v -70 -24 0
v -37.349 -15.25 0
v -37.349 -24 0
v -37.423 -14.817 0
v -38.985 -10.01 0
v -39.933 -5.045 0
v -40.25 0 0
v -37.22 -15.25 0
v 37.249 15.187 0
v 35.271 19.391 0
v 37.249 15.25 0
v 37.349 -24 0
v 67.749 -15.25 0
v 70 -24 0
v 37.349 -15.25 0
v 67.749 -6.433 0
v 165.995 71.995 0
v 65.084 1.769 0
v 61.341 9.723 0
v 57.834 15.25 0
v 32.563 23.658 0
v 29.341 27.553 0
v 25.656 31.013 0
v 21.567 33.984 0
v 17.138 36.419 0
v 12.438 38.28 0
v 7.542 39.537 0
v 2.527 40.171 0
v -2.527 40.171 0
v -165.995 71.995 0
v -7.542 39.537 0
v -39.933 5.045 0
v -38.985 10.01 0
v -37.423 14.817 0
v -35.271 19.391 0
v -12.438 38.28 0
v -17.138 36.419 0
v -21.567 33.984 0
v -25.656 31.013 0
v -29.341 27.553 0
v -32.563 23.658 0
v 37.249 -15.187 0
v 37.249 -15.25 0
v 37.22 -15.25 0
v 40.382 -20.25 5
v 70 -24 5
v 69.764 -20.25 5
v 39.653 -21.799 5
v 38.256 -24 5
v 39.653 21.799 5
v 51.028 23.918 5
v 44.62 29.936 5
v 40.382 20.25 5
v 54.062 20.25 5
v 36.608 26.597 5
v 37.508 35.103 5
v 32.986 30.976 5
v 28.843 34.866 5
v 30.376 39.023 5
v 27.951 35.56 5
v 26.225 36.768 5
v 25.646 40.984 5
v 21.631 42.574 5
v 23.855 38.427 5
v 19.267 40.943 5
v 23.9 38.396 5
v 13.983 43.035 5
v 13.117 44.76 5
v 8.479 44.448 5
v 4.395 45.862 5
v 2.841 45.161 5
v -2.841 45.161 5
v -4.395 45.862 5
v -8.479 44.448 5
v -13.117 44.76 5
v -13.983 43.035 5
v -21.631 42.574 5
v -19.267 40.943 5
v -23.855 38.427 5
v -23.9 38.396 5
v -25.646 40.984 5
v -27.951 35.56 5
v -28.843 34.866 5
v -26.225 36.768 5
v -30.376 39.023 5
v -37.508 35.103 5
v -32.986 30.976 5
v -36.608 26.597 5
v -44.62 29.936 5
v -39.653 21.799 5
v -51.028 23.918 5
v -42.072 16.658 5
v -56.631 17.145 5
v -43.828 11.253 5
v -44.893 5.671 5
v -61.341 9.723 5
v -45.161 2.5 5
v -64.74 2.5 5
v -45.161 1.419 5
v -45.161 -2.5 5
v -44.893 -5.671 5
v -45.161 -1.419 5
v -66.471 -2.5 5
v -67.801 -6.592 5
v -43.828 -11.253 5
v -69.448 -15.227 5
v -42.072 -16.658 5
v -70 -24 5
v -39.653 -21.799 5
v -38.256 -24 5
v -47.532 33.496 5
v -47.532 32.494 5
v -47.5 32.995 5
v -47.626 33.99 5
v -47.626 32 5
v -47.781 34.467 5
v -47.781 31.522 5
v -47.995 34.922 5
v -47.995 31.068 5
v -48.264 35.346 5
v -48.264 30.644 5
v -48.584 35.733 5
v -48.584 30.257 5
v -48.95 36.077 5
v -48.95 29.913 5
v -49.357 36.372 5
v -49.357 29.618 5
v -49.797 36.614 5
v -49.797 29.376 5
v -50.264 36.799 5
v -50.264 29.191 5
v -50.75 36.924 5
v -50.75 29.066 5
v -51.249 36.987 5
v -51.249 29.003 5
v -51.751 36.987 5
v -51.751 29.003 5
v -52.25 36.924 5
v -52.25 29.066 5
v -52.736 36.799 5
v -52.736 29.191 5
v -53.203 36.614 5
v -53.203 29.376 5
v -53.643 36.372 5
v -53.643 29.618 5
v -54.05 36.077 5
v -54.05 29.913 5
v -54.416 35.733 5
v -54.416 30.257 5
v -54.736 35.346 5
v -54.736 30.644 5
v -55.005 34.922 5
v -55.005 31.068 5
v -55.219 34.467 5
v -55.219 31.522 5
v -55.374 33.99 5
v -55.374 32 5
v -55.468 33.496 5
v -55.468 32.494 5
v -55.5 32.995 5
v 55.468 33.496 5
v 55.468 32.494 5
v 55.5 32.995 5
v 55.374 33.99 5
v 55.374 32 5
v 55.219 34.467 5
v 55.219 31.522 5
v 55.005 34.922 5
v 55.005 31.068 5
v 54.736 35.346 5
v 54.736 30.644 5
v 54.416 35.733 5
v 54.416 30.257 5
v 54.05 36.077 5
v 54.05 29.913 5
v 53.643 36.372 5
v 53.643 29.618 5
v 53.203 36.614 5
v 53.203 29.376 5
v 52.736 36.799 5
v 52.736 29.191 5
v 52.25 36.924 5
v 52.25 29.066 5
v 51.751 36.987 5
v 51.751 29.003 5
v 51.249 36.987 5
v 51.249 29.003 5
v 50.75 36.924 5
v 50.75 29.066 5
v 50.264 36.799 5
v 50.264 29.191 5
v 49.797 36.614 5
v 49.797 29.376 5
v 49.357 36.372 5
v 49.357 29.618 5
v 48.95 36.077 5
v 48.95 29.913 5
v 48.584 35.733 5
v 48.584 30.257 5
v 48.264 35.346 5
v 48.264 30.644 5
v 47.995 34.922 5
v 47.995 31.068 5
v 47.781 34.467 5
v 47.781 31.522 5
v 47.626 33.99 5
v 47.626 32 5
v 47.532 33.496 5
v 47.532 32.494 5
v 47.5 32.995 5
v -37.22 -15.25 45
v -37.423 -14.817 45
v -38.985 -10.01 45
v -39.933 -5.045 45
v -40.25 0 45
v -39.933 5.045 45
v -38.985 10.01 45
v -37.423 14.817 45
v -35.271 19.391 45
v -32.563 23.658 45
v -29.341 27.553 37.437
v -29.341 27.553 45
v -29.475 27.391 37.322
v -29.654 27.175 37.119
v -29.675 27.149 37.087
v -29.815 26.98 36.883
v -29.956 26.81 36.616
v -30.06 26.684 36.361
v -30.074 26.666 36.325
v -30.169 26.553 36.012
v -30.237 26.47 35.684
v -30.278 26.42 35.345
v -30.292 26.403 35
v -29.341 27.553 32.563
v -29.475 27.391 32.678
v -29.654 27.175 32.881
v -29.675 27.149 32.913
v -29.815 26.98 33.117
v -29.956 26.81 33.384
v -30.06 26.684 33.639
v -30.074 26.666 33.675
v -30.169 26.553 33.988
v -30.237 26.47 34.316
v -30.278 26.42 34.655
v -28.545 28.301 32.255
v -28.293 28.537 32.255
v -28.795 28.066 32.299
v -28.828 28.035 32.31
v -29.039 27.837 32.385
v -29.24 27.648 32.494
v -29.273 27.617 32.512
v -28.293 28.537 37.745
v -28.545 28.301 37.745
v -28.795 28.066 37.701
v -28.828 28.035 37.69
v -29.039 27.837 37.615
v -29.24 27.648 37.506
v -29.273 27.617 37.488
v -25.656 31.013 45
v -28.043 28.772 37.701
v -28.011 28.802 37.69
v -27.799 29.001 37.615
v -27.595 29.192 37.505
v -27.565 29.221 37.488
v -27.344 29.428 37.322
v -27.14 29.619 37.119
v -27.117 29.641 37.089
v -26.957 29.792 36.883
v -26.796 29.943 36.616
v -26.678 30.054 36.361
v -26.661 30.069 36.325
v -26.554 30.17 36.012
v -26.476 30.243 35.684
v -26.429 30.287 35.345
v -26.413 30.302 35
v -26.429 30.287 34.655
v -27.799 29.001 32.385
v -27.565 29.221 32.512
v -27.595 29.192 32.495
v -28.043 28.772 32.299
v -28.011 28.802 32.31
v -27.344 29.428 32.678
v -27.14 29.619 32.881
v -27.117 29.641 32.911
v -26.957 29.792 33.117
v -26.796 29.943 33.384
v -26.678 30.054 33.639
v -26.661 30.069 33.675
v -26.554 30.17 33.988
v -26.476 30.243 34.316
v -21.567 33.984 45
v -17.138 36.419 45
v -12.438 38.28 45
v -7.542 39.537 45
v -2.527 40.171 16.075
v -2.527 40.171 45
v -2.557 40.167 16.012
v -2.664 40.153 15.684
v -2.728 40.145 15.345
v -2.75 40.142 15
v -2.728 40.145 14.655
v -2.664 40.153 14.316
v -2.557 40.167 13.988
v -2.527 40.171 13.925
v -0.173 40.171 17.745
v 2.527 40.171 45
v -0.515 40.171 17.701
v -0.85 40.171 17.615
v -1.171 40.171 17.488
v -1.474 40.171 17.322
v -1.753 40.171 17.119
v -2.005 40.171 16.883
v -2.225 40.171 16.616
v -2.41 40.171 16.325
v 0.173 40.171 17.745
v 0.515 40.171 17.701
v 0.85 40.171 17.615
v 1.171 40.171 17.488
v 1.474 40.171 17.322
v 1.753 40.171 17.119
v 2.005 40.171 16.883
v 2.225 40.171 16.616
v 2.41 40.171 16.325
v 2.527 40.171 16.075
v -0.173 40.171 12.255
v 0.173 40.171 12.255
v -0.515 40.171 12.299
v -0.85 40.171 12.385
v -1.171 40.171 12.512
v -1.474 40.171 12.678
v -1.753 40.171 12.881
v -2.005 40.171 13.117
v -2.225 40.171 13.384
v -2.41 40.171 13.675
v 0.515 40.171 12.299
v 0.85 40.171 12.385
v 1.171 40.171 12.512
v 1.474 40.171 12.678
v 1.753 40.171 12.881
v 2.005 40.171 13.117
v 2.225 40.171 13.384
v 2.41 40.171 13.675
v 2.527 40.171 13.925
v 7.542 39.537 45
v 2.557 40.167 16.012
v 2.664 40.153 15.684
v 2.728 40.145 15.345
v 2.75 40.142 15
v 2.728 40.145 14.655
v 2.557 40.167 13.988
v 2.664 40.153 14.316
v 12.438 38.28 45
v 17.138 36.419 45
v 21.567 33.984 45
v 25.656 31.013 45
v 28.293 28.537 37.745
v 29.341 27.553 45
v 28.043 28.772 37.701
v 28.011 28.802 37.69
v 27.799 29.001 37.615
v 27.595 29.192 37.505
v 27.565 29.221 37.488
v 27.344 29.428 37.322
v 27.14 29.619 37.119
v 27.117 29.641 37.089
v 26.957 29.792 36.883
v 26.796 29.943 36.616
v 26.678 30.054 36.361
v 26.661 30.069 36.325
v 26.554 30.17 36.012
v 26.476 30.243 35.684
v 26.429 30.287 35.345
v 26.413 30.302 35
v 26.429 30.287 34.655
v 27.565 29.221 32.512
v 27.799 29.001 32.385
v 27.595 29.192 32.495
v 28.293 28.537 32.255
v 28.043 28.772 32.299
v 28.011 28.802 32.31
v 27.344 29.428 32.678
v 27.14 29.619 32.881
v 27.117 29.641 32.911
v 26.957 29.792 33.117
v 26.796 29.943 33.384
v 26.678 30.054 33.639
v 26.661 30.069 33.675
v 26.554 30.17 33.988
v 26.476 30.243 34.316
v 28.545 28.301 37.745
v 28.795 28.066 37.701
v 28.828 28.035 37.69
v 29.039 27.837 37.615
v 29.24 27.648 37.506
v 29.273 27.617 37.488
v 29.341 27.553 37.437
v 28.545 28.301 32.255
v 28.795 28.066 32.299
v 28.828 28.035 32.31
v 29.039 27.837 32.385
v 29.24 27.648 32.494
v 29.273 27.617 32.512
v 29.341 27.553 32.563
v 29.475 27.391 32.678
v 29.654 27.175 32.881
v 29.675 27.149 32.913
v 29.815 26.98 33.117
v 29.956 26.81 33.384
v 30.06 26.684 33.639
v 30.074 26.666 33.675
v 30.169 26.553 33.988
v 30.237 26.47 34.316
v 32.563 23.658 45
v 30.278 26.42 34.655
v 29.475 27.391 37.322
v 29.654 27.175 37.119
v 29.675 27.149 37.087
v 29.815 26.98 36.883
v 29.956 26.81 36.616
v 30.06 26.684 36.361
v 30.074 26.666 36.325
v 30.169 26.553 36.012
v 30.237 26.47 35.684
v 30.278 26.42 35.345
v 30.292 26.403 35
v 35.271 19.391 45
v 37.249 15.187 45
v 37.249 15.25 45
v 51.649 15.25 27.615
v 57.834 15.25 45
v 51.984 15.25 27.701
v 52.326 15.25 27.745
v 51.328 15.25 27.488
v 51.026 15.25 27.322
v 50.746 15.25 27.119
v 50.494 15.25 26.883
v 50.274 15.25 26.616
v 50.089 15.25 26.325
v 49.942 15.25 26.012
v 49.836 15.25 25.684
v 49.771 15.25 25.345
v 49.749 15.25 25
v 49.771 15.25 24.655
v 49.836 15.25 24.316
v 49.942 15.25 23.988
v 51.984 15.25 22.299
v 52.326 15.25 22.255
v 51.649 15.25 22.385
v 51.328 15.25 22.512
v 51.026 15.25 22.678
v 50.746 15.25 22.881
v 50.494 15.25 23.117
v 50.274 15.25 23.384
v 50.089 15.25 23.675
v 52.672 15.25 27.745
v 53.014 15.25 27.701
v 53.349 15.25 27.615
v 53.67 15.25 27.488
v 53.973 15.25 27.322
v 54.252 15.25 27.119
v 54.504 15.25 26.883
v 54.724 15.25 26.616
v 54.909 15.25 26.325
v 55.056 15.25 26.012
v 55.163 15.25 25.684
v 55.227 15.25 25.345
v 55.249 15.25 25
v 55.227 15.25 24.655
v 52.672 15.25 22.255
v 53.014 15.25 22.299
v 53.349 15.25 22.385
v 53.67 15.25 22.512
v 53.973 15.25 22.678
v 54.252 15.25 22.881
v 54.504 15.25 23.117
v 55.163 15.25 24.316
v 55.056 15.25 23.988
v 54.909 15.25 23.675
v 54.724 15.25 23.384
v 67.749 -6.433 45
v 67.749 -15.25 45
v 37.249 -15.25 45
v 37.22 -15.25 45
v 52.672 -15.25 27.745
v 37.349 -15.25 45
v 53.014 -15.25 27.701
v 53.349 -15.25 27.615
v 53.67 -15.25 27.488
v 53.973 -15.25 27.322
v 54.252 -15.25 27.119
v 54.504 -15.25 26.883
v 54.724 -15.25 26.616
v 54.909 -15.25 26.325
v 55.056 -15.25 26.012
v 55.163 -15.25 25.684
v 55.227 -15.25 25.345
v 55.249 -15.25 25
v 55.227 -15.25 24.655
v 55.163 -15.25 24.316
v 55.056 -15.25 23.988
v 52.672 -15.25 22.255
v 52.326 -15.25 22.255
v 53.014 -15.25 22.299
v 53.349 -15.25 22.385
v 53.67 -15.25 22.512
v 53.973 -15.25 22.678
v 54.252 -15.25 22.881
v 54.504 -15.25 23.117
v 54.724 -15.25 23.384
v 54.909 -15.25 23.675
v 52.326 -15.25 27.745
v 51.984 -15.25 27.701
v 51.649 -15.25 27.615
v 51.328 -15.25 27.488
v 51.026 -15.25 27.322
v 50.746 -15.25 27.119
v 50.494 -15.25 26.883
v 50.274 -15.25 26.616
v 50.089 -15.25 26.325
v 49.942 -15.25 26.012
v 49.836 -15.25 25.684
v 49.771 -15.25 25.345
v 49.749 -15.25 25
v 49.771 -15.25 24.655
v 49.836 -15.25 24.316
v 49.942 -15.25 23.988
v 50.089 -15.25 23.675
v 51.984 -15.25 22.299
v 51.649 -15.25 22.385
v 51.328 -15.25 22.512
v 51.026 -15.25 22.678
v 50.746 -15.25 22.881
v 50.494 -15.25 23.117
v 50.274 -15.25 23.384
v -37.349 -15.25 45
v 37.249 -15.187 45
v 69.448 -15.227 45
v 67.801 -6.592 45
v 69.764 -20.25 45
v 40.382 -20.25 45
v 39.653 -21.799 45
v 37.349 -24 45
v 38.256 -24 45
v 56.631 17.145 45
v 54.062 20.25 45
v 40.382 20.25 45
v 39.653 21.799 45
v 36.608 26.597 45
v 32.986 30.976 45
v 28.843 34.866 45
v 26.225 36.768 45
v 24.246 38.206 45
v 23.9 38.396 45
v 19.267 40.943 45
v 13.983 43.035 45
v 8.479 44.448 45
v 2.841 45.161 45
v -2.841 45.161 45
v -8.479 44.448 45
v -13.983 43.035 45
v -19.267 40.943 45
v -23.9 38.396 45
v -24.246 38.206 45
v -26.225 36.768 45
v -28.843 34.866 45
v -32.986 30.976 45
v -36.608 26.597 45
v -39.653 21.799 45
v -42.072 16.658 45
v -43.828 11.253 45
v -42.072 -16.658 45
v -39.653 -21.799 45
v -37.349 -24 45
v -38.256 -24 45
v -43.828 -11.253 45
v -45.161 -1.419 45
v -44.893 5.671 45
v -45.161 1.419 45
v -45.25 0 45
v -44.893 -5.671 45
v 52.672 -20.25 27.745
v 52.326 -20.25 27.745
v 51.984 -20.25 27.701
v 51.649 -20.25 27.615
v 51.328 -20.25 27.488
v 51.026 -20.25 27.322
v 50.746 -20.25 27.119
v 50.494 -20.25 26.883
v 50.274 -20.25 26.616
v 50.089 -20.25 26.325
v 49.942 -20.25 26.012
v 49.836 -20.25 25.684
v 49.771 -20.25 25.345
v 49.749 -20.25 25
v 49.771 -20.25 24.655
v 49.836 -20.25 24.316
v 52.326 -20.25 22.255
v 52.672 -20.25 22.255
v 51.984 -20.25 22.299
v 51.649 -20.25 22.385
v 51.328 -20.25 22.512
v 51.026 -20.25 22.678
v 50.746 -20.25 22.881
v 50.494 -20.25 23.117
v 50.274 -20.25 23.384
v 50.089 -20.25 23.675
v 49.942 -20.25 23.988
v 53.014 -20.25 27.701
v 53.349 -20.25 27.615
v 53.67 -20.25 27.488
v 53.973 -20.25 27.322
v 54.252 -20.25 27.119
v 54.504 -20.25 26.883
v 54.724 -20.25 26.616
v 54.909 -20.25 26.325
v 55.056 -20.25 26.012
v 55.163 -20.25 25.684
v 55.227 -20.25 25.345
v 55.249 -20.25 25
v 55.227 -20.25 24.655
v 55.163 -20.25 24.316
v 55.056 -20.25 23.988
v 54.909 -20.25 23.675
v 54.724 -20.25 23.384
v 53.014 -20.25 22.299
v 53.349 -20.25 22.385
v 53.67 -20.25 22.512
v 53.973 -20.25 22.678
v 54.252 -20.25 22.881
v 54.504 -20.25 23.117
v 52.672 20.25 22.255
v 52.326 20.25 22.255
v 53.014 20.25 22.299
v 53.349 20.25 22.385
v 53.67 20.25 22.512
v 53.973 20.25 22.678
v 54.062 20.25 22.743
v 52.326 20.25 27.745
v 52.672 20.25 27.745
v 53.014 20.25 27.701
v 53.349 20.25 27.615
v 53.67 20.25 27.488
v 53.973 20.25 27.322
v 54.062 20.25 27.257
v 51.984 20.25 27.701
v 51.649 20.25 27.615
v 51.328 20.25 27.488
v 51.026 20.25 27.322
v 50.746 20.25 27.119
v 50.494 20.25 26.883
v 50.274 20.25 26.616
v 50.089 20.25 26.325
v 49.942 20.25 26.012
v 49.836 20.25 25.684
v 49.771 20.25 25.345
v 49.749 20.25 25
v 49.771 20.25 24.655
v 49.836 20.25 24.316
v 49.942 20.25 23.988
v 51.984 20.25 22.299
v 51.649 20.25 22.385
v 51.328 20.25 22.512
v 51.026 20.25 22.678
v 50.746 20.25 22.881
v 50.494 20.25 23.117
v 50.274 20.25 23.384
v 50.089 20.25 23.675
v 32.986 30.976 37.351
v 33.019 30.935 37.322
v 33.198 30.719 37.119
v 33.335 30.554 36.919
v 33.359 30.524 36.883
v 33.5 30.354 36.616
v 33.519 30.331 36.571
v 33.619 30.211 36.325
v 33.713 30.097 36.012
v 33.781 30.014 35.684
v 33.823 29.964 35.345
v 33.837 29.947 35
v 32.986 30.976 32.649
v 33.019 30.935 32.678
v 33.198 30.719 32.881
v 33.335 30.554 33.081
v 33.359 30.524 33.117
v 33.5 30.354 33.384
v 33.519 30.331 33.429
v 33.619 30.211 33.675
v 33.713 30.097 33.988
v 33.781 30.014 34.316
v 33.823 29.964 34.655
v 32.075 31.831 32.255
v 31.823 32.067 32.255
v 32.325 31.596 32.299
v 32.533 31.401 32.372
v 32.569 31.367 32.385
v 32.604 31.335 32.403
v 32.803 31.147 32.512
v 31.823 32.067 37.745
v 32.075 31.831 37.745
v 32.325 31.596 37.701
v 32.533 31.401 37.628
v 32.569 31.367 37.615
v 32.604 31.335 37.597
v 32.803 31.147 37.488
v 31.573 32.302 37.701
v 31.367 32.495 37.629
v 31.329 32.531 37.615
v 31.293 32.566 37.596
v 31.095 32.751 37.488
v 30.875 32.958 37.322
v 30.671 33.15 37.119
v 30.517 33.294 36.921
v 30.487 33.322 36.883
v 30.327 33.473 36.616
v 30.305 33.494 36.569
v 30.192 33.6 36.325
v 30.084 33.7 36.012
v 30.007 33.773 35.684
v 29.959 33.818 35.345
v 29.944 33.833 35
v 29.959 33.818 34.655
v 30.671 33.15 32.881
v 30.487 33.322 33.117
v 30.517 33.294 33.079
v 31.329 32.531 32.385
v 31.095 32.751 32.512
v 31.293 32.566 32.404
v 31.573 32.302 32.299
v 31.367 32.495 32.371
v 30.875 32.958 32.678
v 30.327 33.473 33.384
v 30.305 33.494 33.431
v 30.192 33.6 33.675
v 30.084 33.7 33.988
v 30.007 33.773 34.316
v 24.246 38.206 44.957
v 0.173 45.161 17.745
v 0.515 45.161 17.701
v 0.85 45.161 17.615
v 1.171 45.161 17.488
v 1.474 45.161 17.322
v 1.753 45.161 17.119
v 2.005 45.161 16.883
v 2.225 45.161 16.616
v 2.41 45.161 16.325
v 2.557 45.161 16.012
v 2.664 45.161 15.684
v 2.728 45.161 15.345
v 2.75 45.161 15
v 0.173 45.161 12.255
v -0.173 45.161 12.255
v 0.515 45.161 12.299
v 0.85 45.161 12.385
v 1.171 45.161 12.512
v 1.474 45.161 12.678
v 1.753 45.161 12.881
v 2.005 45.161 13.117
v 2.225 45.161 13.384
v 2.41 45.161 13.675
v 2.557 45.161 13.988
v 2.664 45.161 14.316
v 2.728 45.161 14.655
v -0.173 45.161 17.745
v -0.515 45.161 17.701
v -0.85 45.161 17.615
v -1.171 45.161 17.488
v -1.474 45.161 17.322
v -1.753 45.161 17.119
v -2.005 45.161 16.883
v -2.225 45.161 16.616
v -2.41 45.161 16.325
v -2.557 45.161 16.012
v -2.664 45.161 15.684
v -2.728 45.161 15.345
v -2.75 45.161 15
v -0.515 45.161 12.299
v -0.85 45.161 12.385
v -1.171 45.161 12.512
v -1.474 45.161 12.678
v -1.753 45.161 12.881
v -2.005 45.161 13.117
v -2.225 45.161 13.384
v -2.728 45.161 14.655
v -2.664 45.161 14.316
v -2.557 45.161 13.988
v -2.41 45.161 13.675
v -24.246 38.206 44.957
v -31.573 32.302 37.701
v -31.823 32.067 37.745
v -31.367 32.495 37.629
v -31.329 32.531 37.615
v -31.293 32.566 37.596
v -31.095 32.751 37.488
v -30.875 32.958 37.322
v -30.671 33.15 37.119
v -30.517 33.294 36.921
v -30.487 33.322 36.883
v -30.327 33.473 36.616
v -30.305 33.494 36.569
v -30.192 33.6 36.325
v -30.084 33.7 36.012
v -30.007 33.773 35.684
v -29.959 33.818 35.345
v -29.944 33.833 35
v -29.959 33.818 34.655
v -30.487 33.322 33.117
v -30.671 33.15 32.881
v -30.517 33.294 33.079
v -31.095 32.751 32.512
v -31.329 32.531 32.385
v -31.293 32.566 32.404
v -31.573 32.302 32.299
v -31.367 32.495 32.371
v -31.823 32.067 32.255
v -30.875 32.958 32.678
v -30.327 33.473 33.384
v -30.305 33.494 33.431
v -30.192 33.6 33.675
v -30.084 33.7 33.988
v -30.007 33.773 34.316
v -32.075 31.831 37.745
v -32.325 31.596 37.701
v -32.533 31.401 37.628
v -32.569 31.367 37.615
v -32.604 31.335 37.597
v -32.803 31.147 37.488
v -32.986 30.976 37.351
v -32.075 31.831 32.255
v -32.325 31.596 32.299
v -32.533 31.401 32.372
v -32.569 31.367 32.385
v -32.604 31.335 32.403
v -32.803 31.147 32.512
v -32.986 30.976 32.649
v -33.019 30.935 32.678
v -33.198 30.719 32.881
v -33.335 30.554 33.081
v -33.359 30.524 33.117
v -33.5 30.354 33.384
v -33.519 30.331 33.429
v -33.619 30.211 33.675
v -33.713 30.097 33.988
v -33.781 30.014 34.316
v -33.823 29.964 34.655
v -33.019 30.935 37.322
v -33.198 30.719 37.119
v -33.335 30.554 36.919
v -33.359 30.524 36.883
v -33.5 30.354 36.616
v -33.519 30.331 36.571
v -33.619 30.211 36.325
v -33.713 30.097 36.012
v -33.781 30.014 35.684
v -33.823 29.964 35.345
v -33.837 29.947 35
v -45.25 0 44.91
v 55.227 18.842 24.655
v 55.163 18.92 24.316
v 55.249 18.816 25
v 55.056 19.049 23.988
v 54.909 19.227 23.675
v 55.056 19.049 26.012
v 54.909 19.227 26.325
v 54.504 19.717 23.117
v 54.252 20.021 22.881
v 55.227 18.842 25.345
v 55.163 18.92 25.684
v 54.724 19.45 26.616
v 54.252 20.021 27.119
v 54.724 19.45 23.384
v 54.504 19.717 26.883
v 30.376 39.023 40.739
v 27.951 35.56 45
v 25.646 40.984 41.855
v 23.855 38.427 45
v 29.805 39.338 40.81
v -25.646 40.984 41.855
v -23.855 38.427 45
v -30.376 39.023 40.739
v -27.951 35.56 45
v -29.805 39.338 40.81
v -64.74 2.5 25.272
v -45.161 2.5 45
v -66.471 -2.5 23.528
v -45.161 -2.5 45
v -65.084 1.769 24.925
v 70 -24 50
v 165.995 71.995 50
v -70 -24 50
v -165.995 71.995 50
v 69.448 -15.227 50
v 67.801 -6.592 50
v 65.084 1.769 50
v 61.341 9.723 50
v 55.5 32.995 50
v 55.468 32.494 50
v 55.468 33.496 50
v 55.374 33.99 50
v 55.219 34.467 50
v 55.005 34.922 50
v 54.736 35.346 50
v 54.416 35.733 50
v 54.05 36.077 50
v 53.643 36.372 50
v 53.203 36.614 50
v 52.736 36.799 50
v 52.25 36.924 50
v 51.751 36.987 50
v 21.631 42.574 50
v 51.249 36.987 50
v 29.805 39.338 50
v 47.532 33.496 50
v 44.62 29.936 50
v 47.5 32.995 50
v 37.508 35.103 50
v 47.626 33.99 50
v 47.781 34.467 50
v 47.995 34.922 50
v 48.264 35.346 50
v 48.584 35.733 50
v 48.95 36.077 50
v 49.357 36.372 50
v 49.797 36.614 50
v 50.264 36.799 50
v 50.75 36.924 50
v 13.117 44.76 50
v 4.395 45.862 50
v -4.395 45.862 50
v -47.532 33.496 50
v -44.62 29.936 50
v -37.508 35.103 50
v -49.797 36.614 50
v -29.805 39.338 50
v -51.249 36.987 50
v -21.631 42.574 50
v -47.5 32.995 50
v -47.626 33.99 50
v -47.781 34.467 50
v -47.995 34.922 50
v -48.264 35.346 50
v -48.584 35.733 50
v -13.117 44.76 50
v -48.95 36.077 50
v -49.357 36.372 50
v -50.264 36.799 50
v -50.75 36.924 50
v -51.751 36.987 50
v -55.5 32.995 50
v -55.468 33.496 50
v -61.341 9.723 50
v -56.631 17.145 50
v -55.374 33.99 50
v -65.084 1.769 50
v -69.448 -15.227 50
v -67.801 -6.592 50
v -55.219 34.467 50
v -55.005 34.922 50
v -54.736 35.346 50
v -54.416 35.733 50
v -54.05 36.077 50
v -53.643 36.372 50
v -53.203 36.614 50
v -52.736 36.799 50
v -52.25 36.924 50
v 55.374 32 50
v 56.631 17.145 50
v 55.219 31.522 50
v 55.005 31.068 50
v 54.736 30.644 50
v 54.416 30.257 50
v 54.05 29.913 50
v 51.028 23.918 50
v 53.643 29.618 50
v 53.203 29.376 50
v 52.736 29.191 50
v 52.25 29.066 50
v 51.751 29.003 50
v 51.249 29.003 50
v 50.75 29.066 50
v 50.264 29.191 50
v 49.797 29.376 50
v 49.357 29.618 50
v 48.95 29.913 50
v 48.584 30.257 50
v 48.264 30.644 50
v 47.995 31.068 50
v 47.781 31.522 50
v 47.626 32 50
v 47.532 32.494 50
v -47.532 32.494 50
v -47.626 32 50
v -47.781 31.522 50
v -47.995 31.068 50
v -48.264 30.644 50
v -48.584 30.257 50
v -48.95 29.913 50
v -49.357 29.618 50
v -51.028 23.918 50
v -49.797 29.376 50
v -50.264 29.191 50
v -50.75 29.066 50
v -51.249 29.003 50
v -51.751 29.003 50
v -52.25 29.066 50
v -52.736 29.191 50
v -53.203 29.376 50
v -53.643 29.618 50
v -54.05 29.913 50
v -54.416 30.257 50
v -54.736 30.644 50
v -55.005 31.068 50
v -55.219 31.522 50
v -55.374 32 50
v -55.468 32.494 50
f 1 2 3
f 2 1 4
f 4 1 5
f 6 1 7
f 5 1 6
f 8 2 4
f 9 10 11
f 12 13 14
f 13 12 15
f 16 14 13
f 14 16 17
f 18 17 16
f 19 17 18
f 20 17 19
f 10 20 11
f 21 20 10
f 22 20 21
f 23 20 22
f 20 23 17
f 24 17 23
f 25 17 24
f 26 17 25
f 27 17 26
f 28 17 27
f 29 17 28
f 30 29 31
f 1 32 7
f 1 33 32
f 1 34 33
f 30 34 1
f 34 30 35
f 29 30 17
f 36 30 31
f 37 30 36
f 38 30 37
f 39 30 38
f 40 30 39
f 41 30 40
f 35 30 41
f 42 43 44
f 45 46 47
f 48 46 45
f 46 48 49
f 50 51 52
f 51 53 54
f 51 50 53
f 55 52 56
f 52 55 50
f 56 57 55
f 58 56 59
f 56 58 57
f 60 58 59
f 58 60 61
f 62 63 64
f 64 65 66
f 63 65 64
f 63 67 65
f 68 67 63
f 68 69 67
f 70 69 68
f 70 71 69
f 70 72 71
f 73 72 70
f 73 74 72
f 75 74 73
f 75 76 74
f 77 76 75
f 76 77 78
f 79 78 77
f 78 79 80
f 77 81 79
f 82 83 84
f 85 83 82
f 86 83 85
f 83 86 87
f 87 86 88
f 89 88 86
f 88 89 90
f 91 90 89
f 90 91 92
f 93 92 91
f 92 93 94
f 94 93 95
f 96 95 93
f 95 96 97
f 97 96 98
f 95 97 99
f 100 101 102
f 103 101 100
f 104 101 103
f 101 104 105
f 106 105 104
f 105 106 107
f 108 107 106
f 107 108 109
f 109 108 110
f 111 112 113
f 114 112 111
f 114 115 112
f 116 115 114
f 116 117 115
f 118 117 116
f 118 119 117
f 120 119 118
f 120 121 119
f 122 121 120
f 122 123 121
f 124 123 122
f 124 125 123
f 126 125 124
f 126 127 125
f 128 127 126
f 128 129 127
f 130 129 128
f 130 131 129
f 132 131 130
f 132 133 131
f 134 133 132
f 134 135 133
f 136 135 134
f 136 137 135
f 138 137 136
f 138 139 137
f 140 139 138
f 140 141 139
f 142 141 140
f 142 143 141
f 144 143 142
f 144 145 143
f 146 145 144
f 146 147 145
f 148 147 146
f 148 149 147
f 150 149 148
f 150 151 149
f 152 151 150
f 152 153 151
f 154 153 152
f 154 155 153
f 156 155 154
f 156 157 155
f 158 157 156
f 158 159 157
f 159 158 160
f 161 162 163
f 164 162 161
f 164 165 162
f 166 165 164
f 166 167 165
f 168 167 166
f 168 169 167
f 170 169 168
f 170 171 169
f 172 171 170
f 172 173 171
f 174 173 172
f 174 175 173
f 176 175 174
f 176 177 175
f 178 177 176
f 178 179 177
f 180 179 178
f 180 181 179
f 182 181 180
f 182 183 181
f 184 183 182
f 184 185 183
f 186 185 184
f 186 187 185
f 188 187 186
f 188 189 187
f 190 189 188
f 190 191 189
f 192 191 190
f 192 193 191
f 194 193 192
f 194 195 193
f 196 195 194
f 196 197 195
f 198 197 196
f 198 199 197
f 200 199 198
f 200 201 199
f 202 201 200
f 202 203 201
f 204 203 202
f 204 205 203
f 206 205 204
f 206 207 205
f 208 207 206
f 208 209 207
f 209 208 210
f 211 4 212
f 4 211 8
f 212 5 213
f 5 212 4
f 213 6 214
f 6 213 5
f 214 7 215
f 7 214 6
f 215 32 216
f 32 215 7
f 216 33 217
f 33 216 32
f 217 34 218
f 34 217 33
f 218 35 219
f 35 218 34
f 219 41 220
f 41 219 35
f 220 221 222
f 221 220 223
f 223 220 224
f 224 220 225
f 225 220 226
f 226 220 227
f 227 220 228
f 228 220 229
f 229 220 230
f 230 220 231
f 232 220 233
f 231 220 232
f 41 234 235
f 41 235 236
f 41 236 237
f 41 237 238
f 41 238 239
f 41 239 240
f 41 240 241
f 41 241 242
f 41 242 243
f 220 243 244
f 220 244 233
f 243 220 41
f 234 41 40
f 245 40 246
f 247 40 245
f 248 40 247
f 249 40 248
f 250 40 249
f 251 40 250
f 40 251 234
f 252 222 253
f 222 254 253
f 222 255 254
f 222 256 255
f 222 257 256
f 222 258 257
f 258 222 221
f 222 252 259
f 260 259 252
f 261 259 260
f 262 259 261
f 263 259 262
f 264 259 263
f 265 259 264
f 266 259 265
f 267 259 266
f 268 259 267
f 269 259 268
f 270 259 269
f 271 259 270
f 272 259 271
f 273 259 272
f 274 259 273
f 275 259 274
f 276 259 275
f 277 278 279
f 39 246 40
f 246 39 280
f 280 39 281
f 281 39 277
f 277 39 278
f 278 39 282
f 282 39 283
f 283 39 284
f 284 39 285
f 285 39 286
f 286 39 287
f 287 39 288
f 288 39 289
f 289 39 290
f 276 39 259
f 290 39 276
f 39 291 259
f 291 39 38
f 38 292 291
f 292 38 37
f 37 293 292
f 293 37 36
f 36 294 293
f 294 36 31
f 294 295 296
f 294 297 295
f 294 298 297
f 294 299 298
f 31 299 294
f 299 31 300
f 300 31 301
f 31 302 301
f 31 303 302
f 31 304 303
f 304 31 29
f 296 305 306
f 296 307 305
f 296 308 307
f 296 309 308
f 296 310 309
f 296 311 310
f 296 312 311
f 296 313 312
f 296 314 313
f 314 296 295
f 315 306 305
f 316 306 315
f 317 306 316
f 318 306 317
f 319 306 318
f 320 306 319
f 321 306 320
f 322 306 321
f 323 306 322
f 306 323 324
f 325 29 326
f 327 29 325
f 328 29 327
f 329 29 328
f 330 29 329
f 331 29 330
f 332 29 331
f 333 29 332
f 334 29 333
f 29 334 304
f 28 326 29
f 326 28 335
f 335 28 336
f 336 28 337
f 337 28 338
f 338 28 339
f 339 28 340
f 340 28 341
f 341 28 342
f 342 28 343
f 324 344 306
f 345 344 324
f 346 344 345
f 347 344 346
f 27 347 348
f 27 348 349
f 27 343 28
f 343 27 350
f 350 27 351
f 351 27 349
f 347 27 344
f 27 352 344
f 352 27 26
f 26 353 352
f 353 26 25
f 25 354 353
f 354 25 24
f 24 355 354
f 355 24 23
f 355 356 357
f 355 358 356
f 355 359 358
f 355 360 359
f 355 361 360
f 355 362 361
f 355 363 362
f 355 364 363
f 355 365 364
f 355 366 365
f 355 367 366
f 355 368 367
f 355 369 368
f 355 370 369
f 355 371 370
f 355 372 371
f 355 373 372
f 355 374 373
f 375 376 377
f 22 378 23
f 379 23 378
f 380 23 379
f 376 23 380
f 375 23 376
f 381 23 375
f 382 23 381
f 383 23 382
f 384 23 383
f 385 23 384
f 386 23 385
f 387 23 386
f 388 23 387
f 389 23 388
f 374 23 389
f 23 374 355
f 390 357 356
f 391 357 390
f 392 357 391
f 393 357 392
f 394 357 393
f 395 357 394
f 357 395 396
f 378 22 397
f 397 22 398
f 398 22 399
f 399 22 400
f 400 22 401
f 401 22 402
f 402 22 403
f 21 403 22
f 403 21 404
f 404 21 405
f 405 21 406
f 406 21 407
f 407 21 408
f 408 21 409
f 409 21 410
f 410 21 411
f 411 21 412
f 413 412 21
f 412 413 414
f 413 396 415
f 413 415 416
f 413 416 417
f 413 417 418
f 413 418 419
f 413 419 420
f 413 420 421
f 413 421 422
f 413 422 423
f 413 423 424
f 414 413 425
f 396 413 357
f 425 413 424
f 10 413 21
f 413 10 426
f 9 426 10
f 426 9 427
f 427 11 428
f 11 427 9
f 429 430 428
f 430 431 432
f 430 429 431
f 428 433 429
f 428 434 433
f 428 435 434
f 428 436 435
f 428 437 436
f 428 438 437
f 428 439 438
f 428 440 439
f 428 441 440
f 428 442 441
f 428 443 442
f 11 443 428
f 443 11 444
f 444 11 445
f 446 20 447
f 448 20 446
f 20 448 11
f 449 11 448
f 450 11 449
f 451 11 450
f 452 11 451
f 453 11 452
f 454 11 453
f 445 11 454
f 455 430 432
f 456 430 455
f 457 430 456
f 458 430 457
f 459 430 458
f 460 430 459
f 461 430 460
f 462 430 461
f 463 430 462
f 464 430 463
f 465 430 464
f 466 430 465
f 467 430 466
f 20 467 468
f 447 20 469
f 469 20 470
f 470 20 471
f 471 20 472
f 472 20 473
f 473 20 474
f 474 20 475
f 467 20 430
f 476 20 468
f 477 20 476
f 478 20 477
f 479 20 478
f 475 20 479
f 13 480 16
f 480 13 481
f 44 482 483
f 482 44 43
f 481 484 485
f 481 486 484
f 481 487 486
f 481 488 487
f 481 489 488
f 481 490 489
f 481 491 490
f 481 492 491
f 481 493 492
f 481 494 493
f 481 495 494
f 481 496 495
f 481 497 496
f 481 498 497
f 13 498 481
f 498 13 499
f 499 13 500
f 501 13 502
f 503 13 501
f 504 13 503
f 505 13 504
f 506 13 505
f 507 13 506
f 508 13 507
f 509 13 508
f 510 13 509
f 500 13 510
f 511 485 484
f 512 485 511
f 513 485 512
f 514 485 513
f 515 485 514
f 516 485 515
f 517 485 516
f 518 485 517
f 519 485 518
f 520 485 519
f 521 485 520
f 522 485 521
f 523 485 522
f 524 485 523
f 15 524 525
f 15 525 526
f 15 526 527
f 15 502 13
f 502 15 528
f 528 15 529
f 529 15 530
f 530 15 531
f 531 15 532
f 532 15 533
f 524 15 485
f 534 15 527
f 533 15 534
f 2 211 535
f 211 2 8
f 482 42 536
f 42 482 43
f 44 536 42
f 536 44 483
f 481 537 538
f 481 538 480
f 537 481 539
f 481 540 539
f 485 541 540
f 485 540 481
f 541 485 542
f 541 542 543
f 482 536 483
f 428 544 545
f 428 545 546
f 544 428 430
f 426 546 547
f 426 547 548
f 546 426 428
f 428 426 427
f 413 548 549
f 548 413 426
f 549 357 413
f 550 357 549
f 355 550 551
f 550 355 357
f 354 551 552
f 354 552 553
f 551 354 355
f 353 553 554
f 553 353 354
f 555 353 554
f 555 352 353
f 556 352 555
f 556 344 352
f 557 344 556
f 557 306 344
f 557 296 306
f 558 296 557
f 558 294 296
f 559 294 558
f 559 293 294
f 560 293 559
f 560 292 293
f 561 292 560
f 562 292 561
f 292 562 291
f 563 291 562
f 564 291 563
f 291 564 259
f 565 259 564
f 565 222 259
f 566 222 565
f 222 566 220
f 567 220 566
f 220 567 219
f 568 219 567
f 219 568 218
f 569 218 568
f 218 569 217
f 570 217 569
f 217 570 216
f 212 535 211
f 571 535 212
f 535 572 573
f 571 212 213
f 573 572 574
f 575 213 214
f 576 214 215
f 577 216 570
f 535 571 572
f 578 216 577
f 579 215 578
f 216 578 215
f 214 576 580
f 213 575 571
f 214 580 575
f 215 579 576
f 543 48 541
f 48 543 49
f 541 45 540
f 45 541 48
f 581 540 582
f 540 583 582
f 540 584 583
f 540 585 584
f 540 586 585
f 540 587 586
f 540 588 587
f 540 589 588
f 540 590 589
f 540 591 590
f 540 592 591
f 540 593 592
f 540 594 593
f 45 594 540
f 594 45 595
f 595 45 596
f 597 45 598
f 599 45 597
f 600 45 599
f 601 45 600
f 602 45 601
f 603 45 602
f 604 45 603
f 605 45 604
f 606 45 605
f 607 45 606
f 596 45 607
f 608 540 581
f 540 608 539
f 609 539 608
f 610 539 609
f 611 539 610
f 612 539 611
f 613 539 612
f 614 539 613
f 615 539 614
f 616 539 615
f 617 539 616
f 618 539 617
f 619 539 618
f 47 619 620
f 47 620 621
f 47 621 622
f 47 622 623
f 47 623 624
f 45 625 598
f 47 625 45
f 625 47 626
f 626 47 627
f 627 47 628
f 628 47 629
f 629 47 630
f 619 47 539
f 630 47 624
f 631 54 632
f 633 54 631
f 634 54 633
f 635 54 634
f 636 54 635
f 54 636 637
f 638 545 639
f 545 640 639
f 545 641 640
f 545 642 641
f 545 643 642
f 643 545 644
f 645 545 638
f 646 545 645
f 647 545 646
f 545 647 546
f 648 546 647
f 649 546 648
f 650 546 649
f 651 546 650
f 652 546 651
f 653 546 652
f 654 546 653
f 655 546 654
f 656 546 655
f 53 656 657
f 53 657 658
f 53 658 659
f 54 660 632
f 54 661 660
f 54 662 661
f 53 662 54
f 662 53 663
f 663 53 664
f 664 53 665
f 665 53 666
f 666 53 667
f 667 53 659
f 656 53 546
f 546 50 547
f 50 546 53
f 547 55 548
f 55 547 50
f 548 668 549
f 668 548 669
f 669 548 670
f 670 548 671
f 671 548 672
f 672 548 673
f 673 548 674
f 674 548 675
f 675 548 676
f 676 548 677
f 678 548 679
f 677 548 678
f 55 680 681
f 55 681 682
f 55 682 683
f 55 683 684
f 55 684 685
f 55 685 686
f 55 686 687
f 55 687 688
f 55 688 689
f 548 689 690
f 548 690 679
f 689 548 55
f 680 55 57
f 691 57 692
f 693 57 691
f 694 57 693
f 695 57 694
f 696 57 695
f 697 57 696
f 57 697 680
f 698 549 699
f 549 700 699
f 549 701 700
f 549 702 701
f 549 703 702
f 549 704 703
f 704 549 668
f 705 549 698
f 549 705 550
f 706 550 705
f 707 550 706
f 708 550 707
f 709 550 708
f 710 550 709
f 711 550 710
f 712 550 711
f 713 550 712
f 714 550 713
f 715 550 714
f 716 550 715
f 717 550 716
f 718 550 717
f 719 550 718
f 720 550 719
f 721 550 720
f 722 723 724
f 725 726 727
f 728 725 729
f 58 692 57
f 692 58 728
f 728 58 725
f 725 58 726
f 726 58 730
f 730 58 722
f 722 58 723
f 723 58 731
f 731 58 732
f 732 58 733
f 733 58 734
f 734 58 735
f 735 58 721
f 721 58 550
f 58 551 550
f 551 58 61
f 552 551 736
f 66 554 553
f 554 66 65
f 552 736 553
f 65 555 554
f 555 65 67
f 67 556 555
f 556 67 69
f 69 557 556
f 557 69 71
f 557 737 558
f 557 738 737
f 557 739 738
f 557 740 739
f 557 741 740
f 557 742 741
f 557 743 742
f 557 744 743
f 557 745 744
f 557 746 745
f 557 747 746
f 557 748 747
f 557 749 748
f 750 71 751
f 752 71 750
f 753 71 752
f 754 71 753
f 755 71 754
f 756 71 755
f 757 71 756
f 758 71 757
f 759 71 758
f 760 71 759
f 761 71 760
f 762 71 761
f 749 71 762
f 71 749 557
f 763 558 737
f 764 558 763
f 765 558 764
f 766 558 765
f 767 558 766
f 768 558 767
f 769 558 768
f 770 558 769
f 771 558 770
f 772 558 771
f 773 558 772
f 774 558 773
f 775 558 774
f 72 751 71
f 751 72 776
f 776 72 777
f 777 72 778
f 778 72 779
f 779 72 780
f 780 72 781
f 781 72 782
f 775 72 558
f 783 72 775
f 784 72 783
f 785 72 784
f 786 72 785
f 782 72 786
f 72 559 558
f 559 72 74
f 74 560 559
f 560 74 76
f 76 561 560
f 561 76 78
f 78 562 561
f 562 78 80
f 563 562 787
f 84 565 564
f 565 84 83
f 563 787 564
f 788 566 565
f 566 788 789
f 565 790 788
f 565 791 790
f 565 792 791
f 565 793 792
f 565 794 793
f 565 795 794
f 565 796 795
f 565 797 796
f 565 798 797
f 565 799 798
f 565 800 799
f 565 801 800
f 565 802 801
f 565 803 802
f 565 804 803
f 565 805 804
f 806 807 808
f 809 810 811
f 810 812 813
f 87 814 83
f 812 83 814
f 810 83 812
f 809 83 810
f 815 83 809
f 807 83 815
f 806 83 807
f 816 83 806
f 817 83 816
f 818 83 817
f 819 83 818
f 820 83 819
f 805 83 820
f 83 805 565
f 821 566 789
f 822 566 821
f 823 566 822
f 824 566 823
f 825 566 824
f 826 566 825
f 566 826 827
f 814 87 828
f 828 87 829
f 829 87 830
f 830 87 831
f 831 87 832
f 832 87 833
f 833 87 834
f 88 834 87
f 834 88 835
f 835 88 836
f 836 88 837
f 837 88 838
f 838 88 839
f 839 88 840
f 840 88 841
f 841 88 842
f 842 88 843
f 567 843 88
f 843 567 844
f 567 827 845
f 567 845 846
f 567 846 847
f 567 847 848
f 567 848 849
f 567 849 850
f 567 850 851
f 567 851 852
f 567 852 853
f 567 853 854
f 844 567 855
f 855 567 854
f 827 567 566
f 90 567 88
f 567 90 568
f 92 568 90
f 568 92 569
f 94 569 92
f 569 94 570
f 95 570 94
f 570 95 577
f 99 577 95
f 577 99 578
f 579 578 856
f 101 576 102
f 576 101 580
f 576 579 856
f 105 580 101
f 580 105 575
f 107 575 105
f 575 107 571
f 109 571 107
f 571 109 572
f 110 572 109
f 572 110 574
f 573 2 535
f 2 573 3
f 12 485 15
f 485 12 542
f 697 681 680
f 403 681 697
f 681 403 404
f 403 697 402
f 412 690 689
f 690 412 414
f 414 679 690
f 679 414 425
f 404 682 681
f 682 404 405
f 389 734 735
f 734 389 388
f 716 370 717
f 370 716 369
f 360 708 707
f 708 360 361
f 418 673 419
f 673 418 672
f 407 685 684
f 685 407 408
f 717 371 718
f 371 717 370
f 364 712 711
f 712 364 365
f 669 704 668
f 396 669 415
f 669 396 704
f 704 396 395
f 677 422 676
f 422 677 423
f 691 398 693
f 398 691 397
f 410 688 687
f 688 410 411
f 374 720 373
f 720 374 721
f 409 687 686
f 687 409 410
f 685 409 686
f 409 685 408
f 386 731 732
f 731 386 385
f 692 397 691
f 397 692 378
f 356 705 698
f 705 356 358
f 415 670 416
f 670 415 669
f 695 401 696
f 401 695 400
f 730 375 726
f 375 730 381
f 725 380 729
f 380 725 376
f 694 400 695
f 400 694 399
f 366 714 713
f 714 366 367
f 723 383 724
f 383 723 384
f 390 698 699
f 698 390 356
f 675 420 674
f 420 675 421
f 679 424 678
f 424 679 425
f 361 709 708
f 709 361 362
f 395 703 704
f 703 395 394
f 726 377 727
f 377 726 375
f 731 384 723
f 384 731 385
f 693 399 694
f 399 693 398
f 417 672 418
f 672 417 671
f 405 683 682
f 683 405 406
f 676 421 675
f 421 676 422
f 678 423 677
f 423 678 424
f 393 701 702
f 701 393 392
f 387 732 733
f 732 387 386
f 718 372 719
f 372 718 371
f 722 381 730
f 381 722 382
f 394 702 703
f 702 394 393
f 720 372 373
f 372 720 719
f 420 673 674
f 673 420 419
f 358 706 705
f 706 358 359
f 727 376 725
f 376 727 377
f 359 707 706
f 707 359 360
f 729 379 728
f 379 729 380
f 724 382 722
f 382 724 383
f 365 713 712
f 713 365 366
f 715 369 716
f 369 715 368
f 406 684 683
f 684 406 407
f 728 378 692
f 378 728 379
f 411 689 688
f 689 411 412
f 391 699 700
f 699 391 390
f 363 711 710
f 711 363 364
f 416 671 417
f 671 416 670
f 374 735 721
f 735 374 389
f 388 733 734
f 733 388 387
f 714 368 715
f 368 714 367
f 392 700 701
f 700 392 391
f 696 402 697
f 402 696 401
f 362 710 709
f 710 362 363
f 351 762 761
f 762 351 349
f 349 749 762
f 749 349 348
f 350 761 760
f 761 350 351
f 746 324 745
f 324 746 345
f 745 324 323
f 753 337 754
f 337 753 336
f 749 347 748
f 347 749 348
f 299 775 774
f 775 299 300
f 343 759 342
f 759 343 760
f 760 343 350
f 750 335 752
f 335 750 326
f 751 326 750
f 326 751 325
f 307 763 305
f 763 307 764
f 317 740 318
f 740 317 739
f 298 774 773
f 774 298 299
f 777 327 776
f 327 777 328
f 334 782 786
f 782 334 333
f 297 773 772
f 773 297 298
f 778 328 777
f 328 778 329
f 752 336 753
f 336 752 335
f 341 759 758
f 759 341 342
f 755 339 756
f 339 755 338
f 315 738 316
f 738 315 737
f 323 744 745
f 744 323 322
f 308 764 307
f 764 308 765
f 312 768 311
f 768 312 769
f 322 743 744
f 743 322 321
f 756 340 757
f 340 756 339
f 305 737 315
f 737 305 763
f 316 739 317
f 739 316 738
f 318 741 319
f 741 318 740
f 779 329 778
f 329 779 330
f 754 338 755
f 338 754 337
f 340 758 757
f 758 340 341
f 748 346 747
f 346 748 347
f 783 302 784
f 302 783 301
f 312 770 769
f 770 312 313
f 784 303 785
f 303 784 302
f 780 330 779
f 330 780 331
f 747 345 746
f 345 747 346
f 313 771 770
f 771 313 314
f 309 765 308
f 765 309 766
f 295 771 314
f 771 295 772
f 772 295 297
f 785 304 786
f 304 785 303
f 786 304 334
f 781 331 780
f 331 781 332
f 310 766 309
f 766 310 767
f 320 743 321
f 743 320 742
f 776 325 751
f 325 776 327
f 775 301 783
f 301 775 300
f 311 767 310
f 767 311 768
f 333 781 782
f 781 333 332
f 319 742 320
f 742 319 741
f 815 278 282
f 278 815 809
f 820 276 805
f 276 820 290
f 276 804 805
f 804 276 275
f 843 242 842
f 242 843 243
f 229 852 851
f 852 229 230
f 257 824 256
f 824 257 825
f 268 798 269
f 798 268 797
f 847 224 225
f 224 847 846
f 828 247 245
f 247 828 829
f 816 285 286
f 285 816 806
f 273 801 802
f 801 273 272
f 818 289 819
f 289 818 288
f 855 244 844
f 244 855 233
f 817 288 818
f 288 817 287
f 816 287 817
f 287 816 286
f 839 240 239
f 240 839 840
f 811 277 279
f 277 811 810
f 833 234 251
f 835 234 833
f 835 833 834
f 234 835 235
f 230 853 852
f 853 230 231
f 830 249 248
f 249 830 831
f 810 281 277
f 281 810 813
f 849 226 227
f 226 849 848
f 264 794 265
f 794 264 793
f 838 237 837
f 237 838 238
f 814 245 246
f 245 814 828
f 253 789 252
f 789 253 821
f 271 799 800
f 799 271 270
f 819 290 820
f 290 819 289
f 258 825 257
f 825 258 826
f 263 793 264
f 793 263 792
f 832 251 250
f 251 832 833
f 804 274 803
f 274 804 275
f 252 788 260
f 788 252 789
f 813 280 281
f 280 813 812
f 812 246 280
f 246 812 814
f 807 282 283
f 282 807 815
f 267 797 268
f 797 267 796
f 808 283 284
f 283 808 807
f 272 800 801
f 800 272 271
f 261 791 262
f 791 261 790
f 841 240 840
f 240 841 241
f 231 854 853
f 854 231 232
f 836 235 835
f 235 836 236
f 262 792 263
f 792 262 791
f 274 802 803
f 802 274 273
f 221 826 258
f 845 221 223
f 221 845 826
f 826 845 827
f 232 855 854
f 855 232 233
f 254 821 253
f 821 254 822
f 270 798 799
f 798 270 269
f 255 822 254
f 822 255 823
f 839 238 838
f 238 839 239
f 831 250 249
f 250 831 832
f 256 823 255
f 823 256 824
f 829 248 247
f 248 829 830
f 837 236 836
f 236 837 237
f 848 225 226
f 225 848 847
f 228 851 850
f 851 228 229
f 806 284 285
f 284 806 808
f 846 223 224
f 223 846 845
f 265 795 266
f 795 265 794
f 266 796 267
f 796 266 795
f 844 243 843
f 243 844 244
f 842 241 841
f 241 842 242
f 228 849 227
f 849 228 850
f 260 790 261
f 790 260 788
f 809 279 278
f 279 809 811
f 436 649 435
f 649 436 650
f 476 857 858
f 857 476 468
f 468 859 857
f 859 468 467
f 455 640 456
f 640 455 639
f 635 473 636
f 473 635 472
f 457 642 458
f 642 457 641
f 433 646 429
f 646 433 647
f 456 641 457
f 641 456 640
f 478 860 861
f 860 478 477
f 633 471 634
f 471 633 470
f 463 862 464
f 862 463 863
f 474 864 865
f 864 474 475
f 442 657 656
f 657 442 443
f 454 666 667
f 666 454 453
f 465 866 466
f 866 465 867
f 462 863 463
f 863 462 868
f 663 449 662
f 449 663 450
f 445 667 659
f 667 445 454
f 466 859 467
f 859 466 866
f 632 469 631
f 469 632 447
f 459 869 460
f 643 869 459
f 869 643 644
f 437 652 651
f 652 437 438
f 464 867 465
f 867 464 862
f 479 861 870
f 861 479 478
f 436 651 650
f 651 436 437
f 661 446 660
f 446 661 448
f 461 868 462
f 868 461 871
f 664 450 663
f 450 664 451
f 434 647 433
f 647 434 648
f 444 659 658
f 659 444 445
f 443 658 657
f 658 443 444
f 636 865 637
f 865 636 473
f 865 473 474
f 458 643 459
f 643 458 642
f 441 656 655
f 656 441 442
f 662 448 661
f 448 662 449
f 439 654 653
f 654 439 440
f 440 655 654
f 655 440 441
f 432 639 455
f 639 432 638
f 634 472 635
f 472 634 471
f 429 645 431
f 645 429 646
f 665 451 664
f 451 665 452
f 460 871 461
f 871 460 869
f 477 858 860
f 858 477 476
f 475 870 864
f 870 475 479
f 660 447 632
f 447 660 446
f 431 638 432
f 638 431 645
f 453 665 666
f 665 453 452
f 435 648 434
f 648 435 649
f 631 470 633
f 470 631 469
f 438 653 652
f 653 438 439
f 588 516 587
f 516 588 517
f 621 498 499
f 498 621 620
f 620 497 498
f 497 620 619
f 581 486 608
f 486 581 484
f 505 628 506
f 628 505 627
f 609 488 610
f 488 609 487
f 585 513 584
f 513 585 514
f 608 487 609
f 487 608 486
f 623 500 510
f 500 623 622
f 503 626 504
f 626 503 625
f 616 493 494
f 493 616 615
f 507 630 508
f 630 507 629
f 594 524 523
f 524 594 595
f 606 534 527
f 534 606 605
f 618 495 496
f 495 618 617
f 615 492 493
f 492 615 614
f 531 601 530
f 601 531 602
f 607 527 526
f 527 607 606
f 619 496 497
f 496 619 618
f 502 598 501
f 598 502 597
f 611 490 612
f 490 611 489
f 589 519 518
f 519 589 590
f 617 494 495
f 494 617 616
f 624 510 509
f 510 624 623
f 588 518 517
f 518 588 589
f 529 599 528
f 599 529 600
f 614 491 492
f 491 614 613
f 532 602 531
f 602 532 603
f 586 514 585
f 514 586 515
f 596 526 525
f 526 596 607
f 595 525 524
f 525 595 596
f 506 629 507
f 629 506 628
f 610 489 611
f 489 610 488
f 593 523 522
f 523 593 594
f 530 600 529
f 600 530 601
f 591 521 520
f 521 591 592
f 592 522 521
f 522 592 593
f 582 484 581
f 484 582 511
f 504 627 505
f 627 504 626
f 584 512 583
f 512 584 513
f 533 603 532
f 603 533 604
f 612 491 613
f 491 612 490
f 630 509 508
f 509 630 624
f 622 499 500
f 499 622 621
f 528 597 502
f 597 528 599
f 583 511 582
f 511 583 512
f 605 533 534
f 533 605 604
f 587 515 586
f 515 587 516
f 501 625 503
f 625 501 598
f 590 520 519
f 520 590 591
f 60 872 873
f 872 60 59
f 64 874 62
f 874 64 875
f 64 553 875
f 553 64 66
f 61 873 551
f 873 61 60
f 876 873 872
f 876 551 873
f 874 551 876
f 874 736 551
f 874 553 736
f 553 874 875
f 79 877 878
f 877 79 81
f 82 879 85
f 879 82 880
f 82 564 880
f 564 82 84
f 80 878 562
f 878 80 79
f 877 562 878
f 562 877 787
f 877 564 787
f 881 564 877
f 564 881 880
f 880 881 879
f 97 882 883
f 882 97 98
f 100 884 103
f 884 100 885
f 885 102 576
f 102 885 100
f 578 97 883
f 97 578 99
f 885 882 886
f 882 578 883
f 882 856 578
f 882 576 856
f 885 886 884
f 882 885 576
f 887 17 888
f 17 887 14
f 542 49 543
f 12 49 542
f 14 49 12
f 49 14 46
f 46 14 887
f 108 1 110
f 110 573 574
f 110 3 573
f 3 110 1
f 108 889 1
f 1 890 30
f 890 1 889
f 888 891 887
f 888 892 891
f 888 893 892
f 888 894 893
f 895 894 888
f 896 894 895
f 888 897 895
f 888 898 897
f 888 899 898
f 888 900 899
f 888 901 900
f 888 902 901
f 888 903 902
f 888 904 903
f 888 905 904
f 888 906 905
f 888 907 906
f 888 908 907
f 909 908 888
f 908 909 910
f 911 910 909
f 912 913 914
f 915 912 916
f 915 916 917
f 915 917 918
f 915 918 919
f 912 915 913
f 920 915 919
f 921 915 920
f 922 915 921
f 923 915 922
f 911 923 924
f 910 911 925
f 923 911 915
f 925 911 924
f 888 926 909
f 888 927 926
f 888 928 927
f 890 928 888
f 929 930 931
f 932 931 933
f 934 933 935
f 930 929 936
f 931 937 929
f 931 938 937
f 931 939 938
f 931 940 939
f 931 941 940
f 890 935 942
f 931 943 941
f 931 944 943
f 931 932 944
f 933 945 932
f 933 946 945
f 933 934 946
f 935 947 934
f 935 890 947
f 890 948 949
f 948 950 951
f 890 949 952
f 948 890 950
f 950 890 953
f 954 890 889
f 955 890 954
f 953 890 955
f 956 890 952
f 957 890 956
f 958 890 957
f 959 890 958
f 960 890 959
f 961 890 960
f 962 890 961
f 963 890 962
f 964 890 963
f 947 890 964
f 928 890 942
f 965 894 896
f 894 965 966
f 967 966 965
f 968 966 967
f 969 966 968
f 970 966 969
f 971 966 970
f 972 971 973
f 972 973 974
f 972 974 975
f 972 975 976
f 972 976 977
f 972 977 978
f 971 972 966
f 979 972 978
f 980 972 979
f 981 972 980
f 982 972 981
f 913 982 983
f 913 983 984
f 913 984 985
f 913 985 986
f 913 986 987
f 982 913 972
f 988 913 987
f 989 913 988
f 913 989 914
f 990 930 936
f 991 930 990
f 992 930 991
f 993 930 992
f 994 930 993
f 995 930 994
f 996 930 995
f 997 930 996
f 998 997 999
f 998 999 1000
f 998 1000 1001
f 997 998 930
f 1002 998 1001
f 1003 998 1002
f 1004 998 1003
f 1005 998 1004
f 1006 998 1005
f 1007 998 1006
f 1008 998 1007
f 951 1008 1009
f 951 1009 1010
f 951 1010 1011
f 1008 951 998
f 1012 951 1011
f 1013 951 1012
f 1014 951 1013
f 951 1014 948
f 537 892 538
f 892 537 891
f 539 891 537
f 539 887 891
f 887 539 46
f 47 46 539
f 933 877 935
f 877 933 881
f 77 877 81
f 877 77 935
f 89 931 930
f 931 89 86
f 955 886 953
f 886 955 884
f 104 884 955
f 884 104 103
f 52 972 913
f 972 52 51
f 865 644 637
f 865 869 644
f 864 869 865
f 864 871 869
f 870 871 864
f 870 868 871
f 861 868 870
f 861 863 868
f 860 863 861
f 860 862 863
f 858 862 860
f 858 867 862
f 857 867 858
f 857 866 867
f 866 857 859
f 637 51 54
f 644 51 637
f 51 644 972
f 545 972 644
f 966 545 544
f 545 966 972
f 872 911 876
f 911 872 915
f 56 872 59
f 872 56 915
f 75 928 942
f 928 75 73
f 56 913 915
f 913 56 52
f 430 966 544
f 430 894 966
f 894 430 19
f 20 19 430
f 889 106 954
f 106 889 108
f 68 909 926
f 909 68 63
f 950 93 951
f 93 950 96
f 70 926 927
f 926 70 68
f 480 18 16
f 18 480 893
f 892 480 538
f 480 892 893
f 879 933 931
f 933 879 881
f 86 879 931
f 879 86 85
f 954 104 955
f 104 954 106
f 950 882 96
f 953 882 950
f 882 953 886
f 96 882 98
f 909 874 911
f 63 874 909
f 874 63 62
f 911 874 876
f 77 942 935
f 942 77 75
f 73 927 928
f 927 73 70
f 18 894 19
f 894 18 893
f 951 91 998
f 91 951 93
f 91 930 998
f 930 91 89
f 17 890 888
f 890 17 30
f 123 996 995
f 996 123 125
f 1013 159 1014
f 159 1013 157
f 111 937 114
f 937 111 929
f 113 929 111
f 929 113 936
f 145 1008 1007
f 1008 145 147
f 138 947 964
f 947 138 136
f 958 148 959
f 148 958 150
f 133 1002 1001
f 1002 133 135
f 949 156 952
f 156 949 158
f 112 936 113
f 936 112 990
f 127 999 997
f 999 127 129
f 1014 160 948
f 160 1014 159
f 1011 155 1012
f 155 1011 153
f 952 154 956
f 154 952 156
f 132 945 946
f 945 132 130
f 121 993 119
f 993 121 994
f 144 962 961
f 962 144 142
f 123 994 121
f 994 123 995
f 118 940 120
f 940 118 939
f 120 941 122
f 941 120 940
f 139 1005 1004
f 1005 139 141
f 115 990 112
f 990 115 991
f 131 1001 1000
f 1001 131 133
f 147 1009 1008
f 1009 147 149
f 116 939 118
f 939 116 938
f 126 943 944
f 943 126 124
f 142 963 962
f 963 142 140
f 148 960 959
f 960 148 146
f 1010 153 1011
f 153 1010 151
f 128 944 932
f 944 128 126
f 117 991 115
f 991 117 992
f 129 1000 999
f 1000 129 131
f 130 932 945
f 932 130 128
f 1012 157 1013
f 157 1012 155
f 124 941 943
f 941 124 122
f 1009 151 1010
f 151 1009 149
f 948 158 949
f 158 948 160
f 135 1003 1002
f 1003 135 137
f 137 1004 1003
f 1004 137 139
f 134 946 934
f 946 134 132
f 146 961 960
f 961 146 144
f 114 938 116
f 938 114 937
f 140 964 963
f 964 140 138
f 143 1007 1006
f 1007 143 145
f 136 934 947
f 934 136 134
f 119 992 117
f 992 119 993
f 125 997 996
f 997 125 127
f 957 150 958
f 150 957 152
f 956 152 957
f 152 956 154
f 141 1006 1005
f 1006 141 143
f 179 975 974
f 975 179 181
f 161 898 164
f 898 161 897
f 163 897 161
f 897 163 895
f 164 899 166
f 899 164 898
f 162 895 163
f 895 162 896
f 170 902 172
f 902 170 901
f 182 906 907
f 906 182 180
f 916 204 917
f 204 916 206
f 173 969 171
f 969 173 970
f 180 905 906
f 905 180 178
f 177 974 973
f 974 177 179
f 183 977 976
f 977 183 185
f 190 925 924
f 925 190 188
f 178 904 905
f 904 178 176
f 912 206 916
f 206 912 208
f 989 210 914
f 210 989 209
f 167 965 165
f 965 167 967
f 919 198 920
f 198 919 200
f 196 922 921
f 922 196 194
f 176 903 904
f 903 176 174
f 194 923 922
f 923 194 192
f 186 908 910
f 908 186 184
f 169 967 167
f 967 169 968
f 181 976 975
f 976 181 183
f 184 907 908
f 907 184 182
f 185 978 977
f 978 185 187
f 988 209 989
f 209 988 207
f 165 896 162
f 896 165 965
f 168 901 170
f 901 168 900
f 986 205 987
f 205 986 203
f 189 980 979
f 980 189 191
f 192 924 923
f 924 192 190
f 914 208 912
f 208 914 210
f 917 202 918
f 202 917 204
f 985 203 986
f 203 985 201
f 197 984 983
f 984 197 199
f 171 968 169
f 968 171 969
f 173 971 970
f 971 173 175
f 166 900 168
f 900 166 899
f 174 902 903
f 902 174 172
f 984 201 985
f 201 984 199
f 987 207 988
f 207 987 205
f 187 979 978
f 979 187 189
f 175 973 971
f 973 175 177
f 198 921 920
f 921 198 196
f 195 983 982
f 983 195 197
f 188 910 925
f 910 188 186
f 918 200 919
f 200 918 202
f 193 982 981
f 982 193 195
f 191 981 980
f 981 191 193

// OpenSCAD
$fn=50;
dia_ext=140+30;
dia_int=80.5;
cote_carre=30.5;
epaisseur=5;
hauteur_colonne=40;
dia_trou_vis=5.5;
hauteur_trou=hauteur_colonne/2+epaisseur;

module plat()
{
difference()
{
		circle(d=dia_ext);
		circle(d=dia_int);
		translate([sqrt(pow(dia_int/2,2)-pow(cote_carre/2,2))+cote_carre/2,0,0])
			square([cote_carre,cote_carre],center=true);
	}
}

module colonne()
{
	difference()
	{
		union()
		{
			circle(d=dia_int+epaisseur*2);
			translate([sqrt(pow(dia_int/2,2)-pow(cote_carre/2,2))+cote_carre/2,0,0])
				square([cote_carre+epaisseur*2,cote_carre+epaisseur*2],center=true);
		}
		circle(d=dia_int);
		translate([sqrt(pow(dia_int/2,2)-pow(cote_carre/2,2))+cote_carre/2,0,0])
			square([cote_carre,cote_carre],center=true);
	}	
}

module triangle()
{
	intersection()
	{
		translate([0,dia_ext/4,(hauteur_colonne+epaisseur)/2])
			cube([epaisseur,dia_ext/2,hauteur_colonne+epaisseur],center=true);

		rotate_extrude(convexity=10)
			polygon([[dia_int/2+epaisseur,0],[dia_int/2+epaisseur,hauteur_colonne+epaisseur],[dia_ext/2+epaisseur,0]]);
	}
}

module trou()
{
	translate([0,0,hauteur_trou])
		rotate([-90,0,0])
			cylinder(epaisseur+2,d=dia_trou_vis);
}
module trou_plaque()
{
	translate([0,(dia_int+dia_ext)/4,-1])
		cylinder(epaisseur+2,d=dia_trou_vis);
}

module zone_robot()
{
	linear_extrude(hauteur_colonne+10)
	translate([0,sqrt(pow(140/sin(45/2)/2,2)-pow(140/2,2))+15-39,0])
		rotate([0,0,45/2])
			circle(d=140/sin(45/2),$fn=8);
}

module zone_ouverture()
{
	intersection()
	{
		translate([0,-dia_int/2-epaisseur-cote_carre/2,0])
			square([2*sqrt(pow(dia_int/2,2)-pow(cote_carre/2,2))+0.2,dia_int+epaisseur*2],center=true);
		circle(d=140);
	}
}

module zone_libre()
{
	translate([0,+15-39,-0.1])
		linear_extrude(hauteur_colonne+10.2)
			circle(d=140);
}

module plaque_elec()
{
	translate([0,sqrt(pow(140/sin(45/2)/2,2)-pow(140/2,2))+15-39-70+3/2-3,(hauteur_colonne+50)/2])
		cube([140+2*sqrt(pow(140,2)/2),3,hauteur_colonne+50],center=true);
}

module zone_plaque_elec()
{
	translate([0,sqrt(pow(140/sin(45/2)/2,2)-pow(140/2,2))+15-39-70+140-3,(hauteur_colonne+50)/2-0.1])
		cube([140+2*sqrt(pow(140,2)/2)+0.2,280,hauteur_colonne+50+0.2],center=true);
}

//base du support
module base()
{
	difference()
	{
		union()
		{
			linear_extrude(epaisseur)
				plat();
			translate([0,0,epaisseur])
				linear_extrude(hauteur_colonne)
					colonne();
		}
		translate([0,0,-1])
			linear_extrude(hauteur_colonne+epaisseur+2)
				zone_ouverture();
	}
}

//construction du support
intersection()
{
	union()
	{
		//trous
		difference()
		{
			base();
			for (i=[-45,0,45])
			{
				rotate([0,0,i])
					translate([0,dia_int/2-1,abs(i/45)*20-10])	
						trou();
			}
			translate([sqrt(pow(dia_int/2,2)-pow(cote_carre/2,2))+cote_carre/2,cote_carre/2-1,0])
					trou();
			translate([sqrt(pow(dia_int/2,2)-pow(cote_carre/2,2))+cote_carre/2,-cote_carre/2-epaisseur-1,0])
					trou();
			for (i=[-68,0,80])
			{
				rotate([0,0,i])
						translate([0,abs(i)/65*13-3,0])
							trou_plaque();
			}
		}
		//renforts
		for (i=[-35,35,90])
		{
			rotate([0,0,i])
				triangle();
		}
	}
	difference()
	{
		zone_robot();
		translate([0,-0.5,0])
			zone_plaque_elec();
	}
}

//zone accessible pour mettre le support
#difference()
{
	zone_robot();
	zone_libre();
	zone_plaque_elec();
	translate([-103/2,sqrt(pow(140/sin(45/2)/2,2)-pow(140/2,2))+15-39-70-3-39,-5])
		cylinder(d=8,h=2*hauteur_colonne+10);
	translate([103/2,sqrt(pow(140/sin(45/2)/2,2)-pow(140/2,2))+15-39-70-3-39,-5])
		cylinder(d=8,h=2*hauteur_colonne+10);
}

//zone_plaque_elec();
//zone_ouverture();
//trou_plaque();
